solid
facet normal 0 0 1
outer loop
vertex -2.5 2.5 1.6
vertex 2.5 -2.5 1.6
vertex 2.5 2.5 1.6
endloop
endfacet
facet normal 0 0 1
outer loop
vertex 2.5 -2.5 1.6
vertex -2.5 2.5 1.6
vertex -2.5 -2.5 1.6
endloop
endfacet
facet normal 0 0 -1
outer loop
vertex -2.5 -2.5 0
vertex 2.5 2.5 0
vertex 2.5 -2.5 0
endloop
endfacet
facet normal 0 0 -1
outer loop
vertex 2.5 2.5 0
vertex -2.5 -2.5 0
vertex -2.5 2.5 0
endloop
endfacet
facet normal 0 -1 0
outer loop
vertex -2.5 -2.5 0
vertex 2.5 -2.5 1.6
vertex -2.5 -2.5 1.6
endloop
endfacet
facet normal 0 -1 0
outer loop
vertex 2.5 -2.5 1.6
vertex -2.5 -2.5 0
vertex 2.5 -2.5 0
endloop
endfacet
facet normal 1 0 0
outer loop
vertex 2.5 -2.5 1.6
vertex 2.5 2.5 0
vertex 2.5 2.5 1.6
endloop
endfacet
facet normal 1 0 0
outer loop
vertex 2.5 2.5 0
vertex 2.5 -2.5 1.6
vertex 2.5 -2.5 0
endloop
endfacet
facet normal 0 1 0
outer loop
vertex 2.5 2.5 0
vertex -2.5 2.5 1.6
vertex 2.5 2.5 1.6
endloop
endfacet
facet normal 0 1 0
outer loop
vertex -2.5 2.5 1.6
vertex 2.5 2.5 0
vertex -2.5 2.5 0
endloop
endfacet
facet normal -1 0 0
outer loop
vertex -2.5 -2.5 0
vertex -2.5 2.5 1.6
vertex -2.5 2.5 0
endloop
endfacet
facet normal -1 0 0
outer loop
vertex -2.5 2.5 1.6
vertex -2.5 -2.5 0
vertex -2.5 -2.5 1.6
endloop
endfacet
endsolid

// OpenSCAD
module dut_pcb(size=[5,5,1.6]) {
    // Test PCB
    color("green")translate([0,0,size[2]/2])cube(size, center=true);
};

dut_pcb();
